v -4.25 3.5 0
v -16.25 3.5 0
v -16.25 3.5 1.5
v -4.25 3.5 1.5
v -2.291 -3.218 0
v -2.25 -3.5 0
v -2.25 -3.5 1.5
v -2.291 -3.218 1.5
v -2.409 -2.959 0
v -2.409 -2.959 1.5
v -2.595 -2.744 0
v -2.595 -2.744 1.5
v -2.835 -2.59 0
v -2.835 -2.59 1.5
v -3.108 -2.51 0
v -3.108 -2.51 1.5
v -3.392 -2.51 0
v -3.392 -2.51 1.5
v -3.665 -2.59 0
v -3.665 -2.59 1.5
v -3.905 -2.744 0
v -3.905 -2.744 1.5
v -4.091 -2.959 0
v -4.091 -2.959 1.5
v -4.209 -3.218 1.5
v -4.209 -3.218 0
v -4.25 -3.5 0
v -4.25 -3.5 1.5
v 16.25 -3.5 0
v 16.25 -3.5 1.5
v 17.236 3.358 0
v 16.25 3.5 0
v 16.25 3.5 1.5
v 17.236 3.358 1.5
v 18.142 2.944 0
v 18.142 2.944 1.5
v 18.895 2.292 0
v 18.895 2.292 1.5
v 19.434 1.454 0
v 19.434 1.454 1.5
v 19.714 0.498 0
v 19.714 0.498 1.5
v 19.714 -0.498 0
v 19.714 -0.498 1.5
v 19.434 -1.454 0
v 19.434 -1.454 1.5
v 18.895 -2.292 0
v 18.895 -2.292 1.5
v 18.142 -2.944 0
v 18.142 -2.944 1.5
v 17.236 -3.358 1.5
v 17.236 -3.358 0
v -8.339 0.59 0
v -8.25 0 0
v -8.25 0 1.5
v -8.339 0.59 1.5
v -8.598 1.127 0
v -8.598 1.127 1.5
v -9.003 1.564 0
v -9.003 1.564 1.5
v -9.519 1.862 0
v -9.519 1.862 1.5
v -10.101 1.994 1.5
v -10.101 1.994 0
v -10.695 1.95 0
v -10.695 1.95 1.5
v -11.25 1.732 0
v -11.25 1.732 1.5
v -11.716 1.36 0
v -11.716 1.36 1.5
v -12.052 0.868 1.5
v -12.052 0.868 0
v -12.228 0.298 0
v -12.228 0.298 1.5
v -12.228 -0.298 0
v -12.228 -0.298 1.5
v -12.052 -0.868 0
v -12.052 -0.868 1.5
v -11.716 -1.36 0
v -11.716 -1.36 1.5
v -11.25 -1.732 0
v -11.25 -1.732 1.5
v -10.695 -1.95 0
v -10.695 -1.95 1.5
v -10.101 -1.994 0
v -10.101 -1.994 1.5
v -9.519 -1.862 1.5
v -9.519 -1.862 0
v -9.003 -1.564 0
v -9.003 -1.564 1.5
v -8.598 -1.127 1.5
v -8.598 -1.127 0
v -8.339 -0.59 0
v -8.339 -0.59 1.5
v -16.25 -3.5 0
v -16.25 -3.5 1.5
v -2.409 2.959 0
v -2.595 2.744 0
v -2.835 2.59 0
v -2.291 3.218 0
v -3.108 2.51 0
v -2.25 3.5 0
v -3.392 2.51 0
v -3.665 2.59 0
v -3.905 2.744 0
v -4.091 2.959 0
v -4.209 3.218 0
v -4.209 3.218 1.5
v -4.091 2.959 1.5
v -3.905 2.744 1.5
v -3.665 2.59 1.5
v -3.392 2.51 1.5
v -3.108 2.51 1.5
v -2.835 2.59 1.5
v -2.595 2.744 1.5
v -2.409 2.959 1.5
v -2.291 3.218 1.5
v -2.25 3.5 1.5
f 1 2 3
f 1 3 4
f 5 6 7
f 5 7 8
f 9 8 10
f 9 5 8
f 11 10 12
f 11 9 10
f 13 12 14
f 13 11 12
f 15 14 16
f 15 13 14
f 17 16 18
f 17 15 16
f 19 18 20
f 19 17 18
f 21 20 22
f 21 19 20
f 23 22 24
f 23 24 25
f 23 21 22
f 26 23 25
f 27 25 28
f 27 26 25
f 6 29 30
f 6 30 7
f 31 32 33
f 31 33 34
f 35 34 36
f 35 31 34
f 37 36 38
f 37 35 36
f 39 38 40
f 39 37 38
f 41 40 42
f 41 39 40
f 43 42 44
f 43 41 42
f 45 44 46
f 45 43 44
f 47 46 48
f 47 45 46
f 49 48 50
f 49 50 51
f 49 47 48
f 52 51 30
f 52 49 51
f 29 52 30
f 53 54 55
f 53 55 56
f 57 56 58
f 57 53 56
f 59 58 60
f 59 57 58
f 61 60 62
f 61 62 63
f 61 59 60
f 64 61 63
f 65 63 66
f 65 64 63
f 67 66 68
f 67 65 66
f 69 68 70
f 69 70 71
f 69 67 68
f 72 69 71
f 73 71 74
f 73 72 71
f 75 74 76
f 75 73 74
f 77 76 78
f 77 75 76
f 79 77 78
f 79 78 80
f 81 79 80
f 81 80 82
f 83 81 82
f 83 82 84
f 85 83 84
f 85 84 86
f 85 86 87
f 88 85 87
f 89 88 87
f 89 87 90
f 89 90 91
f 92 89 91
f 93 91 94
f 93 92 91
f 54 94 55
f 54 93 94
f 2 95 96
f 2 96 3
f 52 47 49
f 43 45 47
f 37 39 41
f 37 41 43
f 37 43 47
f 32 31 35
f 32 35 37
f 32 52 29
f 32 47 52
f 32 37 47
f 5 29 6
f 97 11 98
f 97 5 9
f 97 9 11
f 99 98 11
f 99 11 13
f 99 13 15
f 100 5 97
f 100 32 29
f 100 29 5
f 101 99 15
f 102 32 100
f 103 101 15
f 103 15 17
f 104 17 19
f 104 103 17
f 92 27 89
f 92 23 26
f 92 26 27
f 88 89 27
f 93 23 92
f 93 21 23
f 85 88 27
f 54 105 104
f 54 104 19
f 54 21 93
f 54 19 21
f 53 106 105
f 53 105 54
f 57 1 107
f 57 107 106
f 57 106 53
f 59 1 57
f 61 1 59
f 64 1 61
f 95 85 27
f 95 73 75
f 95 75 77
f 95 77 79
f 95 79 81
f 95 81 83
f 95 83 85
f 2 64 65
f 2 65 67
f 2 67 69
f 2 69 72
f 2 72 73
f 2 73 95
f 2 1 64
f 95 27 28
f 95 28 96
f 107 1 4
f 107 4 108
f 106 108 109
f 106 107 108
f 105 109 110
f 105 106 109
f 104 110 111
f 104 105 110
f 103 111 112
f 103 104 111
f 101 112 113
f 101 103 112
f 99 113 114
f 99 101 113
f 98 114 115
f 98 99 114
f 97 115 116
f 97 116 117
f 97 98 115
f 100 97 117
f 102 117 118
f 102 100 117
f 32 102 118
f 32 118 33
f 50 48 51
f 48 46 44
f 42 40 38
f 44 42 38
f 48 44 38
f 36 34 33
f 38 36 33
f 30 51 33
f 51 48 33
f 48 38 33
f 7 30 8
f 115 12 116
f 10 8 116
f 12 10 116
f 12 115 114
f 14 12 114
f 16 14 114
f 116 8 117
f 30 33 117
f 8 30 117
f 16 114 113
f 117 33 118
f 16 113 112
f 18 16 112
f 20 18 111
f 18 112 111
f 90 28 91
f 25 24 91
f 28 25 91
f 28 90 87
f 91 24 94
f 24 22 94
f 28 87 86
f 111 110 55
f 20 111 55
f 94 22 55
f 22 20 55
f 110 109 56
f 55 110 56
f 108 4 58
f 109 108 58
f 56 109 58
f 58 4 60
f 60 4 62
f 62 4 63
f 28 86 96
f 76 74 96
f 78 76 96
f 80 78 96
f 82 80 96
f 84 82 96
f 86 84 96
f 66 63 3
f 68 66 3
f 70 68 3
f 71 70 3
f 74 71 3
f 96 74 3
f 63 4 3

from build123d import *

# Parameters (mm, degrees)
SKETCH1_R           = 2
BOSS_EXTRUDE1_DEPTH = 1.5


with BuildPart() as part:
    # Sketch1 → Boss-Extrude1 (new body)
    with BuildSketch(Plane.XY):
        with BuildLine():
            Line((-16.25, 3.5), (-4.25, 3.5))
            ThreePointArc((-4.25, 3.5), (-3.25, 2.5), (-2.25, 3.5))
            Line((-2.25, 3.5), (16.25, 3.5))
            ThreePointArc((16.25, 3.5), (19.75, 0), (16.25, -3.5))
            Line((16.25, -3.5), (-2.25, -3.5))
            ThreePointArc((-2.25, -3.5), (-3.25, -2.5), (-4.25, -3.5))
            Line((-4.25, -3.5), (-16.25, -3.5))
            Line((-16.25, -3.5), (-16.25, 3.5))
        make_face()
        with Locations((-10.25, 0)):
            Circle(SKETCH1_R, mode=Mode.SUBTRACT)
    extrude(amount=BOSS_EXTRUDE1_DEPTH)


solid = part.part
